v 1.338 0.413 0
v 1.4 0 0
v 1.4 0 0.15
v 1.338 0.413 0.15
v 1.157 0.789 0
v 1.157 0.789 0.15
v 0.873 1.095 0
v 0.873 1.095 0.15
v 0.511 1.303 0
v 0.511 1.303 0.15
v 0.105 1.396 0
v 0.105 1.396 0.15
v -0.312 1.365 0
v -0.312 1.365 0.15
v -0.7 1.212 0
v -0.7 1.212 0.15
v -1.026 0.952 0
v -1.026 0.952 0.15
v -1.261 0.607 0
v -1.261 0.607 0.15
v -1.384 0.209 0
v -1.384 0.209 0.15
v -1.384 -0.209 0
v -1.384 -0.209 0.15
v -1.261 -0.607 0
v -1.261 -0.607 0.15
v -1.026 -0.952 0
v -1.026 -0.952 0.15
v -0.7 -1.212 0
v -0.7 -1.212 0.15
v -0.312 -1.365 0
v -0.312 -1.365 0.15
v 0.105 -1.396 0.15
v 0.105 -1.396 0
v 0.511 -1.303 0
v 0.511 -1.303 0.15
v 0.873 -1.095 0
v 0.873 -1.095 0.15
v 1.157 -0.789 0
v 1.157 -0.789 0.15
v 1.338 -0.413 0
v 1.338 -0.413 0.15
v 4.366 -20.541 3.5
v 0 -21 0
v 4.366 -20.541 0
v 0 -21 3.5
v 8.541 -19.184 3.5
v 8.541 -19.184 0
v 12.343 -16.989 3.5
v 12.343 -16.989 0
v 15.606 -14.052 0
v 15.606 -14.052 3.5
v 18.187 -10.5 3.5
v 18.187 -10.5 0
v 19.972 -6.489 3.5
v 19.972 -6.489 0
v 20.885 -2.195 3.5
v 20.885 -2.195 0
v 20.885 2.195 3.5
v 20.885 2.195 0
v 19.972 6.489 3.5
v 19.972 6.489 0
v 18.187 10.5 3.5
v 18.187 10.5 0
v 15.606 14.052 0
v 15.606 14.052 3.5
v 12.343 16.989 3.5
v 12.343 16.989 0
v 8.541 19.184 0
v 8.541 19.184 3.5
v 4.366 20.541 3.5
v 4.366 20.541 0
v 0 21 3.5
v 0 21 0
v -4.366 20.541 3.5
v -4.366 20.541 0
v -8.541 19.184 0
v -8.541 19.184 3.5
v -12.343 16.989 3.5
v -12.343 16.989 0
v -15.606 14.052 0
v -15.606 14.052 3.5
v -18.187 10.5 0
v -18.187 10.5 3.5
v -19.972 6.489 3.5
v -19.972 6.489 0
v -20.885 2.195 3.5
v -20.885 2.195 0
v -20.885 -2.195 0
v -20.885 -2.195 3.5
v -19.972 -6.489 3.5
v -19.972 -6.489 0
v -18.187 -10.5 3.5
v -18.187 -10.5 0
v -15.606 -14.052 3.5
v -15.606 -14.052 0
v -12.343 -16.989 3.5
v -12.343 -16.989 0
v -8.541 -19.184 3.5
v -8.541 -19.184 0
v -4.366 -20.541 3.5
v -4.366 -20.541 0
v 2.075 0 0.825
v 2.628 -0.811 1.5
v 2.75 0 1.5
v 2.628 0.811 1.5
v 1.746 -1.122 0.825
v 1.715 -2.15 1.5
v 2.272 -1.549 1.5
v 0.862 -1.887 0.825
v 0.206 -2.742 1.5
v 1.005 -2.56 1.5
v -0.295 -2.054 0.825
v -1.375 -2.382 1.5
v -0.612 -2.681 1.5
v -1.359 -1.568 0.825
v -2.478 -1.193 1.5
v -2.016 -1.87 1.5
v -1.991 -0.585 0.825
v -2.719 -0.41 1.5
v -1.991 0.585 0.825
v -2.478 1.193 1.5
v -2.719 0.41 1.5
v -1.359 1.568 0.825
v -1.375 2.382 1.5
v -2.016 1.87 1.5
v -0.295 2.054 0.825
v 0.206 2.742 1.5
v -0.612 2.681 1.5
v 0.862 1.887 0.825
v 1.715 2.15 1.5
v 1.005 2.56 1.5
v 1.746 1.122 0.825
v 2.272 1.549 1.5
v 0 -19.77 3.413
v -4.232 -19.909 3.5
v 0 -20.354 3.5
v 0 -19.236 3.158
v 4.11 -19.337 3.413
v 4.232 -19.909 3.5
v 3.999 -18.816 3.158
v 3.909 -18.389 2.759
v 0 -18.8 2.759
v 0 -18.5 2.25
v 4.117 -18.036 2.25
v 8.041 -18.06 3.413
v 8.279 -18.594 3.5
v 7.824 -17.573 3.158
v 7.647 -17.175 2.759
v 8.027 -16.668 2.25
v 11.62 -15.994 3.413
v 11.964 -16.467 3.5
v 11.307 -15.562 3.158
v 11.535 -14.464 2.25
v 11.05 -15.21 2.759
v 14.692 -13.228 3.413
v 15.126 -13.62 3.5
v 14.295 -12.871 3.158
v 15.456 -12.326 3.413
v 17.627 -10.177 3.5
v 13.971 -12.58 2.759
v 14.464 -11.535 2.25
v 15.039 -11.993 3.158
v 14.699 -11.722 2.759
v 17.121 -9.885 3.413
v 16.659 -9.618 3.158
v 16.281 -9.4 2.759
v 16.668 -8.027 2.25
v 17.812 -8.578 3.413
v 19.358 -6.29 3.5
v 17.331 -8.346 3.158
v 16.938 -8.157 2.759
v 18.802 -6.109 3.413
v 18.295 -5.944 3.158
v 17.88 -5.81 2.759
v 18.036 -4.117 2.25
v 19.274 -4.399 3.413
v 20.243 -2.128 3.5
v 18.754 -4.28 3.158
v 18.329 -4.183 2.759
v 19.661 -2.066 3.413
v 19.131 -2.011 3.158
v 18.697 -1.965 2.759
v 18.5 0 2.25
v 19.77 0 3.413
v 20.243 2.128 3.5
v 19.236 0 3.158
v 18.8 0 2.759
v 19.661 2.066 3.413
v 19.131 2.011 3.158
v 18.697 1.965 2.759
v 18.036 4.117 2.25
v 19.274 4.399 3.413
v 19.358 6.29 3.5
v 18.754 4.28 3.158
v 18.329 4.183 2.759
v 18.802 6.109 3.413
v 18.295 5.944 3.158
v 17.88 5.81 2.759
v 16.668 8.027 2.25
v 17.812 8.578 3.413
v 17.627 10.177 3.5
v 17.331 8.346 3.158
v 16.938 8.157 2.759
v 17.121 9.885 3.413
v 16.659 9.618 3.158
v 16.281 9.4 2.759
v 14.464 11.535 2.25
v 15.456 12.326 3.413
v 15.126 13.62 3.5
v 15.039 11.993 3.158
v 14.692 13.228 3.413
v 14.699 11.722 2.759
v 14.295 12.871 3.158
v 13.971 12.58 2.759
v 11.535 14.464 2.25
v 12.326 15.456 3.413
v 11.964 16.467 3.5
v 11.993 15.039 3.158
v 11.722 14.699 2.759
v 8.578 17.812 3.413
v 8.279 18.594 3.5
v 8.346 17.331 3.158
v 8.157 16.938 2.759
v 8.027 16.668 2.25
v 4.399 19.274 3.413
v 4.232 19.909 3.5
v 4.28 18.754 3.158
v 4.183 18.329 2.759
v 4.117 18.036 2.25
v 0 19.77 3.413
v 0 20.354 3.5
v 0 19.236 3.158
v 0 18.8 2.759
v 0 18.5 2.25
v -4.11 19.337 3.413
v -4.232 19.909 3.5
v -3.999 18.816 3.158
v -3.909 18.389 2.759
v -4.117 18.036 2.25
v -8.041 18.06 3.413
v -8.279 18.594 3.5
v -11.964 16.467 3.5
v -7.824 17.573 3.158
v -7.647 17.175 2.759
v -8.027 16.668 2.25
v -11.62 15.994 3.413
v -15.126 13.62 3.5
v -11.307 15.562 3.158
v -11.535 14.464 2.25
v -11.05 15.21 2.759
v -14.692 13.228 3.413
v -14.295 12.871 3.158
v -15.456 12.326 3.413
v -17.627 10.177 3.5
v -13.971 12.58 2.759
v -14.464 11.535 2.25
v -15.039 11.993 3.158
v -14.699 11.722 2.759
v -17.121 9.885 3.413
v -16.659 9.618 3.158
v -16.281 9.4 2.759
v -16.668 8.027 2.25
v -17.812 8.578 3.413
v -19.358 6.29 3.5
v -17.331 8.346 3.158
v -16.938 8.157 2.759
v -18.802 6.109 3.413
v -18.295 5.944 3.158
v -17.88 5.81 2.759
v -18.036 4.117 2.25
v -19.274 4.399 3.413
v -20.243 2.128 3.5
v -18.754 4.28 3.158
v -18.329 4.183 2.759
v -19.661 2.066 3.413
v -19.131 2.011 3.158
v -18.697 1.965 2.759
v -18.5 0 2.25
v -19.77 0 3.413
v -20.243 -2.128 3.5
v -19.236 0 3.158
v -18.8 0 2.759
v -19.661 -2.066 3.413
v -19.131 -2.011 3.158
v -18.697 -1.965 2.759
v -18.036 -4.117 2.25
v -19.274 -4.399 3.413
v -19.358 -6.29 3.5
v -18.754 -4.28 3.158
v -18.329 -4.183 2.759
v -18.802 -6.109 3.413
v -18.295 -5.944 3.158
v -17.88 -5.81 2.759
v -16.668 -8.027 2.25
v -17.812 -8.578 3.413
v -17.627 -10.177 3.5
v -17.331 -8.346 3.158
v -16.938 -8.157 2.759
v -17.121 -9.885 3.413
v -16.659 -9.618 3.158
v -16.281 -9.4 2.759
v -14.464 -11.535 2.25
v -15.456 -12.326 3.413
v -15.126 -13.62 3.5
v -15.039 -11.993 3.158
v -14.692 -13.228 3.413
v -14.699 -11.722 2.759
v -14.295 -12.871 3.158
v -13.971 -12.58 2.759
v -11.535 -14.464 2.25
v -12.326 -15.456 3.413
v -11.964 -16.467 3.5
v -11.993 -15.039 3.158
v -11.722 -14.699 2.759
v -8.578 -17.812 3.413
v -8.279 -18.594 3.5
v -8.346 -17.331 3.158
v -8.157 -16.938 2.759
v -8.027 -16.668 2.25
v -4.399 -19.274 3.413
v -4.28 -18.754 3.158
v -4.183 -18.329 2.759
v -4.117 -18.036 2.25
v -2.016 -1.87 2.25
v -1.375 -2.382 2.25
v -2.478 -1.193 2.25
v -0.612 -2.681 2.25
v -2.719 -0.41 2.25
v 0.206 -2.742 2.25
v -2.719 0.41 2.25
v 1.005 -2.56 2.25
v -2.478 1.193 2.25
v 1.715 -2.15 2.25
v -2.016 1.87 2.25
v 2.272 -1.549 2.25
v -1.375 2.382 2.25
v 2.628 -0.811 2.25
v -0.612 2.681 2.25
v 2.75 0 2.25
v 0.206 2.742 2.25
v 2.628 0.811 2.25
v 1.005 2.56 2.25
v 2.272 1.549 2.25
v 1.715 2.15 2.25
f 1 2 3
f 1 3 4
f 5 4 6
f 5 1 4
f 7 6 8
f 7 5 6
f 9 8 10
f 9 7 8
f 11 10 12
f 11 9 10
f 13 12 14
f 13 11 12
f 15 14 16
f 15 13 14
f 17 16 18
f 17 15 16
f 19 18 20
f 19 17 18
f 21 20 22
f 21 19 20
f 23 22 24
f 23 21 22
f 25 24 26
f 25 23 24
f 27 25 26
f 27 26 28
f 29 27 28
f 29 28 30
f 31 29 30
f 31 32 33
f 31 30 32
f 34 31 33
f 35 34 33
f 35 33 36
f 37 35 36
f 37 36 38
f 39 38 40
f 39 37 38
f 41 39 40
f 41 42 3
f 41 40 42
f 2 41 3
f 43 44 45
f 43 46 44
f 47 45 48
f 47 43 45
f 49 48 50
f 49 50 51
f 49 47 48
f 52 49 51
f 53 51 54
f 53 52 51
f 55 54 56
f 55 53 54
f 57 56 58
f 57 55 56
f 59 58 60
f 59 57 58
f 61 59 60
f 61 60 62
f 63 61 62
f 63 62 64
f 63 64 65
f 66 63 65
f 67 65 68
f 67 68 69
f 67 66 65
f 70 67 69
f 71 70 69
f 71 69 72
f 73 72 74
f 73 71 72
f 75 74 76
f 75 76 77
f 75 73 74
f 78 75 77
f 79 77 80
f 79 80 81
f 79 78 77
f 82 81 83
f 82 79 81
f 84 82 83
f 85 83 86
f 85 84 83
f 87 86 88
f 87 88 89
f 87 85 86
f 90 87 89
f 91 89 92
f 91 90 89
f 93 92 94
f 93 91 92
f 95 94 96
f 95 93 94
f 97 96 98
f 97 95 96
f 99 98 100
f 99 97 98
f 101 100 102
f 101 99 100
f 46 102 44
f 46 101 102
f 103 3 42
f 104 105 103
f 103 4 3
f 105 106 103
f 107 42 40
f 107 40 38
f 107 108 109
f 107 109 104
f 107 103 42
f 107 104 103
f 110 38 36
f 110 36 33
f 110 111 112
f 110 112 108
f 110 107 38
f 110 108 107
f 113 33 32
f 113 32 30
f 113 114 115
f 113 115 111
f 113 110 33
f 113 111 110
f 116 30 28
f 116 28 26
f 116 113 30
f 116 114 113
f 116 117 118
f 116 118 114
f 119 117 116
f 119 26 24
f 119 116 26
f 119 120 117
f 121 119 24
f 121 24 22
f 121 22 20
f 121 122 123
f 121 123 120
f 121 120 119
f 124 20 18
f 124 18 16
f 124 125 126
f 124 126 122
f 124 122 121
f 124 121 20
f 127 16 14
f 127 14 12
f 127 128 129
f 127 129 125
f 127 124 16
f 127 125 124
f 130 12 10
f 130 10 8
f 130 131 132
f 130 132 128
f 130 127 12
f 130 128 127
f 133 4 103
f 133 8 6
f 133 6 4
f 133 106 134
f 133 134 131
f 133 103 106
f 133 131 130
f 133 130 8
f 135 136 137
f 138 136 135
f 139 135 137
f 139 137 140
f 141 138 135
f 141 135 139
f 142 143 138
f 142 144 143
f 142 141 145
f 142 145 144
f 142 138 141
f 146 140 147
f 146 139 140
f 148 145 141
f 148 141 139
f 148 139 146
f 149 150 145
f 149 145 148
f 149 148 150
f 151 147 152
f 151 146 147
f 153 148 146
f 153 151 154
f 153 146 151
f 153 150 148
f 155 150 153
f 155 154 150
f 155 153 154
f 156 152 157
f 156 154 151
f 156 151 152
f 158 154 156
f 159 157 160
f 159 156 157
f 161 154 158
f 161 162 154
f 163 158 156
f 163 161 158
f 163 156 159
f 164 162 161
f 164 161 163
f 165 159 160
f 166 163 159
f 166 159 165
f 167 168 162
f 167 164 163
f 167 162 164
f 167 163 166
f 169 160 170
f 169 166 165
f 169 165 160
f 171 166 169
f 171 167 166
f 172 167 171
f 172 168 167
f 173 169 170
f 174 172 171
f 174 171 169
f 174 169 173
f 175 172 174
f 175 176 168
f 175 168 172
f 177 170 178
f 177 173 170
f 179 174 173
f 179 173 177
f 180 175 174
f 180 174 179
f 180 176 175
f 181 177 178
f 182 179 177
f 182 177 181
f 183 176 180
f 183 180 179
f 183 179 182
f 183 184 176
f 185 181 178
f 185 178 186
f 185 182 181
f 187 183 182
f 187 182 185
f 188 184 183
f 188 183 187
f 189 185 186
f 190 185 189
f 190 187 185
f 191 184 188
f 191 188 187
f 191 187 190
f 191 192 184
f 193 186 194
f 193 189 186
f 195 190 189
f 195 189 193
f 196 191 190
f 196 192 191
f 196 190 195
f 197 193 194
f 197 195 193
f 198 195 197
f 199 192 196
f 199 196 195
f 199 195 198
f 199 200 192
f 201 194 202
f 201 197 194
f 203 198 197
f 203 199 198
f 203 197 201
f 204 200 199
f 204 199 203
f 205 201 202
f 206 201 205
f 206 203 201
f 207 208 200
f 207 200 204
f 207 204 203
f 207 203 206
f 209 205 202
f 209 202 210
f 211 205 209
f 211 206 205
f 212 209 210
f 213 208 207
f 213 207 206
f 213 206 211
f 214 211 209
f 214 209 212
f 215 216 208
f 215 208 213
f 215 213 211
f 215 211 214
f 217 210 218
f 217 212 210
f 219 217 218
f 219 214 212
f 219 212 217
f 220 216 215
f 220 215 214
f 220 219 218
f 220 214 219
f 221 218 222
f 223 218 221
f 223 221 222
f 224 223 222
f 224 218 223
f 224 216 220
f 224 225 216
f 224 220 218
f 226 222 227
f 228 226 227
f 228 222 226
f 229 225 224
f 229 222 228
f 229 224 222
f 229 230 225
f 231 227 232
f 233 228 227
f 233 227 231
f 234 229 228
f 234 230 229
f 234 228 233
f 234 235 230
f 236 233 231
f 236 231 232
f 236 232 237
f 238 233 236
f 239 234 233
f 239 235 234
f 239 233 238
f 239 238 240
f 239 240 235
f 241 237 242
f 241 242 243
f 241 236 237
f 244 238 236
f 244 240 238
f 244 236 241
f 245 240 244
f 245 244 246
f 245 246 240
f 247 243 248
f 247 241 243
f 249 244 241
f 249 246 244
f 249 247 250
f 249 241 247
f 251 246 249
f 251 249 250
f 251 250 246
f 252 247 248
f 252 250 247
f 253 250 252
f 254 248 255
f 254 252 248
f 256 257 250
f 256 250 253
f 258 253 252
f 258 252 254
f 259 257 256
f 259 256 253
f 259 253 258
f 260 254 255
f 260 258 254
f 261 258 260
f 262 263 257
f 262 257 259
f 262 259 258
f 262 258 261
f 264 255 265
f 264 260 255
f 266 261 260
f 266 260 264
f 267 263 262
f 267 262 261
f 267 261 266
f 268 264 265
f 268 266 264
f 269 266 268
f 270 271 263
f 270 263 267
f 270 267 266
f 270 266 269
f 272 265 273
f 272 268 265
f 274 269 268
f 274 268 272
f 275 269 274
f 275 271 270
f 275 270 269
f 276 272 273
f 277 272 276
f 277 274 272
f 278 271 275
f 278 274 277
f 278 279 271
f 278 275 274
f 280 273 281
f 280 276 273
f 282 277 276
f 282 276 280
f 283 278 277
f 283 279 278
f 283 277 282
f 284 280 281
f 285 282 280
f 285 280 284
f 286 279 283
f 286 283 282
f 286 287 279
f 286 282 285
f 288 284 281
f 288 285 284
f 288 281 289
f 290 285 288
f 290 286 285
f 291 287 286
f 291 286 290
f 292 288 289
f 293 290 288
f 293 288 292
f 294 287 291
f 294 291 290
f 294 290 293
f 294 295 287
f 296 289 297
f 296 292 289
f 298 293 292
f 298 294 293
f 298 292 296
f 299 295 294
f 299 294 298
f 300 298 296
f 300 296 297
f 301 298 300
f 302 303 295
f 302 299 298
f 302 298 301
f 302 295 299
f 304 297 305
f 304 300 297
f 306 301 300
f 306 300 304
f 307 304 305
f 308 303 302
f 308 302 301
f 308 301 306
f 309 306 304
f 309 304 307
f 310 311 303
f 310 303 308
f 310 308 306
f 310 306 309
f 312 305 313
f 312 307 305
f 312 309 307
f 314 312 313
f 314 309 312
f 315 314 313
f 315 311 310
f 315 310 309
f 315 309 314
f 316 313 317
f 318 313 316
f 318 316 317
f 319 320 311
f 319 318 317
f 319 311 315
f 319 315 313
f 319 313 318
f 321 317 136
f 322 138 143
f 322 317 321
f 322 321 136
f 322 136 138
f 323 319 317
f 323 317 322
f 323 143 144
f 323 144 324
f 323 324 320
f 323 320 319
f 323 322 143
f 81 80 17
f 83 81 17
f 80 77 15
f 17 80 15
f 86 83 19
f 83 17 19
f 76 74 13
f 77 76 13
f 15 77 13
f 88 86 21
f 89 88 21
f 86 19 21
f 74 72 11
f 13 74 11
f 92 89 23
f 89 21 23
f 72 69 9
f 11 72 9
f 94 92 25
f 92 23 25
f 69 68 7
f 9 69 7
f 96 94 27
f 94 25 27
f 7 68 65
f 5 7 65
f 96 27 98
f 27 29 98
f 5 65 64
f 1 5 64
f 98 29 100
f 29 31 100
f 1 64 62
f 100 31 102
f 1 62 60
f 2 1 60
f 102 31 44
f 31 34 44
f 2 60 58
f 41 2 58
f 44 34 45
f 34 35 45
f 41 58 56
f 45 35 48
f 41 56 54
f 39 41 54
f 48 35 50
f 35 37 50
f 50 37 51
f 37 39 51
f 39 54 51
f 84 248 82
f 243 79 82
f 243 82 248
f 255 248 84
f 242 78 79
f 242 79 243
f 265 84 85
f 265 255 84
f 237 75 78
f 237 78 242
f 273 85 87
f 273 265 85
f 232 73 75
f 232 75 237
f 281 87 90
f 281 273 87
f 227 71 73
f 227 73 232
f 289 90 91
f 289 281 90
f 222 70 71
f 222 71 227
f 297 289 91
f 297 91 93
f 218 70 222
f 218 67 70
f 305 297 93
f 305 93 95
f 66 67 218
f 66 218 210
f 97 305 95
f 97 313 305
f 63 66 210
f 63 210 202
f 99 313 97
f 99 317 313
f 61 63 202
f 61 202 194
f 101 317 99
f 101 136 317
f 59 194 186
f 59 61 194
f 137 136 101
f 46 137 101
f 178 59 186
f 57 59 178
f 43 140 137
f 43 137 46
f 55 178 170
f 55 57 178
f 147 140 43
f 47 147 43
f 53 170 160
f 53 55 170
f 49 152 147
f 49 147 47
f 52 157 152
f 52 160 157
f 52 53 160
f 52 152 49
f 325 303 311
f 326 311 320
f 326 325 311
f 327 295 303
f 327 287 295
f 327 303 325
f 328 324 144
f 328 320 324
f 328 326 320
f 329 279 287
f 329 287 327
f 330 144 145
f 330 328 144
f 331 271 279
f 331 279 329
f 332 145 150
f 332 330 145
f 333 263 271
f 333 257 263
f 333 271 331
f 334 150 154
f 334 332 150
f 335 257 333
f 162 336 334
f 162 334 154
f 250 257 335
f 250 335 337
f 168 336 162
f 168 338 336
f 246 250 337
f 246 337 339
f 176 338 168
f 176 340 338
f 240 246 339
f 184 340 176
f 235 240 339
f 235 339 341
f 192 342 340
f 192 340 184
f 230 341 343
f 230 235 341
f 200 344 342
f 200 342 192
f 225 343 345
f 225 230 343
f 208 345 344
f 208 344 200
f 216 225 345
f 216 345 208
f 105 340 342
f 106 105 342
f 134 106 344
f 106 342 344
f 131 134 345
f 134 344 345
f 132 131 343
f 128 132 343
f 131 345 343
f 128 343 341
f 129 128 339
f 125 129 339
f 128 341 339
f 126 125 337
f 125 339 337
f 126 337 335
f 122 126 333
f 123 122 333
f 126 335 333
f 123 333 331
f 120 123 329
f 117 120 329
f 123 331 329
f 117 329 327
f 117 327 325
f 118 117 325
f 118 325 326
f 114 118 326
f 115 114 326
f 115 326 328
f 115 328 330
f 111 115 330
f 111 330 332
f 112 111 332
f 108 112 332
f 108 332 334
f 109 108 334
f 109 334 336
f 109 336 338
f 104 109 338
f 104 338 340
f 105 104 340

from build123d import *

# Parameters (mm, degrees)
F0_R        = 18.5
F0_R_2      = 1.4
F1_DEPTH    = 2.25
F2_R        = 2.75
F3_DEPTH    = 0.1
F4_S5_R     = 2.75
F4_T6_DEPTH = 6
F6_W        = 2.5
F6_H        = 3.5


# Not quite as in the source:
# - a fillet or chamfer that OpenCascade refuses, or shapes differently, is made with other operations: its cross-section is extruded or revolved along the edge and cut away or added
# - a feature names something its author has since deleted; it is built from what else it names


with BuildPart() as f1:
    # F0 (on Top) → F1 (new body)
    with BuildSketch(Plane.XY):
        Circle(F0_R)
        Circle(F0_R_2, mode=Mode.SUBTRACT)
    extrude(amount=F1_DEPTH)

    # F2 (on face) → F3 (cut)
    with BuildSketch(Plane.XY.offset(2.25)):
        Circle(F2_R)
    extrude(amount=-F3_DEPTH, mode=Mode.SUBTRACT)

    # F4: chamfer of 2 on 1 edges, made by hand


with BuildPart() as f4_tool2:
    # F4_s3 → F4_t4 (revolve)
    with BuildSketch(Plane.XZ):
        Polygon((1.4, 0.15), (3.4, 2.15), (1.4, 2.15), align=None)
    revolve(axis=Axis((0, 0, 2.15), (0, 0, -1)))

    # F4_s5 → F4_t6 (intersect, symmetric)
    with BuildSketch(Plane.XY.offset(1.2)):
        Circle(F4_S5_R)
    extrude(amount=F4_T6_DEPTH, both=True, mode=Mode.INTERSECT)


with BuildPart() as f1_1:
    add(f1.part)

    # F4_t1: cut F4_tool2
    add(f4_tool2.part, mode=Mode.SUBTRACT)

    # F6 (on Right) → F7 (revolve)
    with BuildSketch(Plane.YZ):
        with Locations((-19.75, 1.75)):
            Rectangle(F6_W, F6_H)
    revolve(axis=Axis((0, 0, 7.0907436311), (0, 0, 1)))

    # F8: fillet of radius 2 on 1 edges, made by hand

    # F8_s1 → F8_t2 (revolve, cut)
    with BuildSketch(Plane.YZ):
        with BuildLine():
            ThreePointArc((-20.3540496218, 3.5), (-19.236015633, 3.1583123952), (-18.5, 2.25))
            Line((-18.5, 2.25), (-18.5, 3.5))
            Line((-18.5, 3.5), (-20.3540496218, 3.5))
        make_face()
    revolve(axis=Axis((0, 0, 3.5), (0, 0, 1)), mode=Mode.SUBTRACT)


solid = f1_1.part
